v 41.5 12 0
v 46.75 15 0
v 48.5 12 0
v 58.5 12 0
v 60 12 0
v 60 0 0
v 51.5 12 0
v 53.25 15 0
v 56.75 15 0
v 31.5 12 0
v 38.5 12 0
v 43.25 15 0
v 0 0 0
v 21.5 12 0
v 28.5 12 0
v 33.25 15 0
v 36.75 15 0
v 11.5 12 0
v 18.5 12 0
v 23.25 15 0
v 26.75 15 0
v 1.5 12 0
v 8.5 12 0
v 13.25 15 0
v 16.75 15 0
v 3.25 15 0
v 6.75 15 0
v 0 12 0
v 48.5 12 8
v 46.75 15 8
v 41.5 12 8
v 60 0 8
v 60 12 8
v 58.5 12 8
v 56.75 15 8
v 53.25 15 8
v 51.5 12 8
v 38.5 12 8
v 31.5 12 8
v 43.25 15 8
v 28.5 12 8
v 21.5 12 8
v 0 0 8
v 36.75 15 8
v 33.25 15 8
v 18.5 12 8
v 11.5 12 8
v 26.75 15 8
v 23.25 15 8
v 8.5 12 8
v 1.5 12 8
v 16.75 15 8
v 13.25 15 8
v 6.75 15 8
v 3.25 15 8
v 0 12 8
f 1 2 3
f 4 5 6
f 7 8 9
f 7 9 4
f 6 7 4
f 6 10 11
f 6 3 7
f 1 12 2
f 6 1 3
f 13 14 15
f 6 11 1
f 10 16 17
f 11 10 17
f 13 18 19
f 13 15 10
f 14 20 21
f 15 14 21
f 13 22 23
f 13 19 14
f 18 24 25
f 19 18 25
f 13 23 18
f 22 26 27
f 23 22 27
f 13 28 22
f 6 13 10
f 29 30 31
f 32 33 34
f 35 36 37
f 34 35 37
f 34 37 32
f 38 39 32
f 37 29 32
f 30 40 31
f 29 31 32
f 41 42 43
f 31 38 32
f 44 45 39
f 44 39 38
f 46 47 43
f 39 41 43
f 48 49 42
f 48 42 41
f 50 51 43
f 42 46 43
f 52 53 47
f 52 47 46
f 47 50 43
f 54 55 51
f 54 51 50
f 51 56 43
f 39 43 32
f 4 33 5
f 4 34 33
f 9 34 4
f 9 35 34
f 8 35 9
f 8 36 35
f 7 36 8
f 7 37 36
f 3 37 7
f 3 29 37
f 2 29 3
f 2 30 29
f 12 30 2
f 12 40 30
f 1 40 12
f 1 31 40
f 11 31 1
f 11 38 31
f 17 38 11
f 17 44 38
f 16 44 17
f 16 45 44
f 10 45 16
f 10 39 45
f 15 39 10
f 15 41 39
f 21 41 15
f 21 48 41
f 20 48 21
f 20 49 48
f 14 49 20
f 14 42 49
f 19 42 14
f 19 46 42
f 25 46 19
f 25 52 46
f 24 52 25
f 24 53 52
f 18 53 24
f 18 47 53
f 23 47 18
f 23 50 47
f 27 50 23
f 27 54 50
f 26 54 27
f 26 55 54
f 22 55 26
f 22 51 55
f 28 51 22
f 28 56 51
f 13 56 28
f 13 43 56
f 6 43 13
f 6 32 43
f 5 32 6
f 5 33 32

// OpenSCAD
$fn = 32;

// ----------------------------------------------------------------------
// Gear rack: 6 teeth, pitch 10 mm
// ----------------------------------------------------------------------

// --- parameters (mm) ---
teeth = 6;                // number of teeth
pitch = 10;               // tooth pitch, X
root_w = 7;               // tooth width at the root
tip_w = 3.5;              // tooth width at the tip
base_h = 12;              // rack body height, Y
tooth_h = 3;              // tooth height above the body
plate_t = 8;              // rack width, Z (extrusion height)

rack_l = teeth * pitch;  // overall length
total_h = base_h + tooth_h;  // overall height

profile = [[0, 0], [60, 0], [60, 12], [58.5, 12], [56.75, 15], [53.25, 15], [51.5, 12], [48.5, 12], [46.75, 15], [43.25, 15], [41.5, 12], [38.5, 12], [36.75, 15], [33.25, 15], [31.5, 12], [28.5, 12], [26.75, 15], [23.25, 15], [21.5, 12], [18.5, 12], [16.75, 15], [13.25, 15], [11.5, 12], [8.5, 12], [6.75, 15], [3.25, 15], [1.5, 12], [0, 12]];  // primary outline, 28 points, counter clockwise

// --- the one profile operation ---
linear_extrude(height = plate_t) polygon(points = profile);
